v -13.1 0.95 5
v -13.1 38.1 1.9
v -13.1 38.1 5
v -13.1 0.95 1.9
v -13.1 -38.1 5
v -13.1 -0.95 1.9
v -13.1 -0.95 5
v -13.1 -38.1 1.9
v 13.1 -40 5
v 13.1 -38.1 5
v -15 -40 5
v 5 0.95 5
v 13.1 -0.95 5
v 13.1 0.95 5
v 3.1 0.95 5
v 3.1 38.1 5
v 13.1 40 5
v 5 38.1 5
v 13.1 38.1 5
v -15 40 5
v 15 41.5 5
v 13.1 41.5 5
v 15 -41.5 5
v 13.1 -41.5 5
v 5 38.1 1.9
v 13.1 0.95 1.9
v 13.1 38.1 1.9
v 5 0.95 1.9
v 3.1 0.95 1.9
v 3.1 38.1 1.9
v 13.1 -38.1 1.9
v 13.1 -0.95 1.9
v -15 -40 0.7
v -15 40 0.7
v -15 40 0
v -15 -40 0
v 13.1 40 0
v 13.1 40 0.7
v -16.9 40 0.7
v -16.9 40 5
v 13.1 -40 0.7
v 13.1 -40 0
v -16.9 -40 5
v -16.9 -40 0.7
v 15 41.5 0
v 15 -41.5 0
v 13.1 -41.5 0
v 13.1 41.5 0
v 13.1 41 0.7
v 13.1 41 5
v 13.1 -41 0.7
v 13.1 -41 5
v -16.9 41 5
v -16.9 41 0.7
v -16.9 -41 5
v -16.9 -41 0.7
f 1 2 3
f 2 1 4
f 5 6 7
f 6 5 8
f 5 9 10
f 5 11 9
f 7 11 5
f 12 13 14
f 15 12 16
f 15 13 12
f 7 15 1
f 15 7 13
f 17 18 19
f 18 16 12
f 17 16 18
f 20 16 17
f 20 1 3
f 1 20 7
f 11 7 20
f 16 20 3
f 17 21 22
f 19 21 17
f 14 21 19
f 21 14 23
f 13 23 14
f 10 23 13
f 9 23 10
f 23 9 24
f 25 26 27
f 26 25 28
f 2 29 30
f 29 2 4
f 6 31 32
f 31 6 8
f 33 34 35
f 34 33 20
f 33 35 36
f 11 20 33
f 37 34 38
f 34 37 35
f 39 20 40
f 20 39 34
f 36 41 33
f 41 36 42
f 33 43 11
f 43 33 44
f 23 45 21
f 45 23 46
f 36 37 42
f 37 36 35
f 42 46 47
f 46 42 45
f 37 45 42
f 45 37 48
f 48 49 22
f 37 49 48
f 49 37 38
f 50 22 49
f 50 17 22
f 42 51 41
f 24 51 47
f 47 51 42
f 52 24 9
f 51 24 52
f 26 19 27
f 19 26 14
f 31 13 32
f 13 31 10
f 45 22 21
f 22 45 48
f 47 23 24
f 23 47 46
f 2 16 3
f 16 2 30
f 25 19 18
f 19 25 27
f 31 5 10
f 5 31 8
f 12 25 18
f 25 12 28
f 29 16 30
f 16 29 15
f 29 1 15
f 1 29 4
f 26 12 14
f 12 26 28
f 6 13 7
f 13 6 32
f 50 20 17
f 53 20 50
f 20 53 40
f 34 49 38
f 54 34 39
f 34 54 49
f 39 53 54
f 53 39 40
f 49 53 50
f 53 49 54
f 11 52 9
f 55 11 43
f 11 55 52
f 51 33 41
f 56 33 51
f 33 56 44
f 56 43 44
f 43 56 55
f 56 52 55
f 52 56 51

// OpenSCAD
// file: ../hdim.scad
module hdim(x1 = 10, x2 = 20, y = 10, dimline_lenght = 9.0) 
{
    dimline_overlap = 0.5;
    dimline_width = 0.3;
    text_size = 2;
    tmp = 2*dimline_overlap+text_size/2;
    text_pos = dimline_lenght>0 ? tmp : -tmp; 
    dimline_abs = dimline_lenght>0 ? dimline_lenght : -dimline_lenght;
    
    color([0,0,0])
    {
        translate([x1,y-dimline_lenght/2,0]) 
            square([dimline_width, 
                dimline_abs + 2*dimline_overlap], 
                center=true, $fs=0.01);
                
        translate([x2,y-dimline_lenght/2,0]) 
            square([dimline_width, 
                dimline_abs + 2*dimline_overlap], 
                center=true, $fs=0.01);

        translate([(x1+x2)/2,y-dimline_lenght,0]) 
            square([x2-x1, 
                dimline_width], 
                center=true, $fs=0.01);
    }
        
    translate([(x1+x2)/2,y-dimline_lenght-text_pos,0]) 
    {
        color([0,0,0])
        cube([text_size * 5, 1.2*text_size, 0.9], center=true);
        
        color([0.8,0.8,0.5,1.0])
        {
            translate([0,0,0.2])
            text(str(0.1*round((x2-x1)*10)), size = text_size, 
                halign = "center",valign = "center");
            translate([0,0,-0.2])
            rotate([0,180,0])
            text(str(0.1*round((x2-x1)*10)), size = text_size, 
                halign = "center",valign = "center");
        }
    }
}

hdim();
// main file
use <../hdim.scad> 

box_l = 30; // Depth max 54
box_w = 80; 
box_h = 5;
plywood_t = 1.9;

slider_t = 1; // thickness
slider_w = 4.3; // width
slider_l = 30; // length
slider_m = slider_l; // movement

module printershelfdrawer(open = false)
{
  explode = false;
  final_view = false;
  
  edelta = explode ? 12 : 0;
  opaque10 = final_view ? 0 : 0.1;
    
  translate([open?slider_m:0,0,0])
  {  
    color([51/255, 34/255, 6/255, 1-opaque10]) 
    translate([-plywood_t/2,0,plywood_t/2])
    cube([box_l-plywood_t, box_w, plywood_t], center=true);
    
    if (!final_view) {
        hdim(-box_l/2, box_l/2-plywood_t, box_w/2, -2);
        rotate([0,0,90]) 
        hdim(-box_w/2, box_w/2, box_l/2, -5);
    }

    cover_over = 1.5;
    
    color([121/255, 44/255, 16/255, 1-2*opaque10]) {
        translate([-box_l/2+plywood_t/2-edelta,0,box_h/2+plywood_t/2])
        cube([plywood_t, box_w, box_h-plywood_t],
            center=true);
        
        translate([box_l/2-plywood_t/2+edelta,0,box_h/2])
        cube([plywood_t, box_w+2*cover_over, box_h],
            center=true); 
    }

    dim1 = (box_l - 2*plywood_t)/2;
    dim2 = (box_h - plywood_t)/2;
    dim3 = box_h/2;

    if (!final_view) {
        translate([0, -edelta, box_h/2+plywood_t/2]) 
        rotate([0,0,180]) 
        hdim(-dim1, dim1, box_w/2, -5);
        
        translate([0, -edelta-box_w/2+plywood_t/2,
            box_h/2+plywood_t/2]) 
        rotate([0,90,90]) 
        hdim(-dim2, dim2, -dim1, 5);
    }
    
    color([91/255, 78/255, 66/255, 1-2*opaque10]) {
        translate([0,box_w/2-plywood_t/2+edelta,
            box_h/2+plywood_t/2])
        cube([box_l - 2*plywood_t, plywood_t,
            box_h-plywood_t], center=true);
        
        translate([0,-box_w/2+plywood_t/2-edelta,
            box_h/2+plywood_t/2])
        cube([box_l - 2*plywood_t, plywood_t, 
            box_h-plywood_t], center=true);
    }
    
    if (!final_view) {
        translate([0,0,box_h/2+plywood_t/2])
        rotate([0,0,90]) 
        hdim(-box_w/2-cover_over, 
            box_w/2+cover_over, 
            -box_l/2-edelta, 7); 
        
        translate([edelta+box_l/2-plywood_t/2,
        0, box_h/2]) 
        rotate([0,90,-90]) hdim(-dim3, dim3, 0, -4);
    }
 
    main_divider_pos = 10;
    color([91/255, 44/255, 16/255, 1-2*opaque10]) 
    {
        ww = box_w/2 - 1.5 * plywood_t;
      translate([box_l/2 - plywood_t/2
        + edelta - main_divider_pos,
        ww/2+plywood_t/2,box_h/2+plywood_t/2])
      cube([plywood_t, ww, 
        box_h-plywood_t], center=true);
            
      translate([0,0,
            box_h/2+plywood_t/2])
      cube([box_l - 2*plywood_t, plywood_t, 
            box_h-plywood_t], center=true);

      }
    
    translate([-slider_l + box_l/2 - plywood_t, 
        box_w/2, box_h-slider_w]) 
    slider(open);
    
    translate([-slider_l + box_l/2 - plywood_t, 
        -box_w/2, box_h-slider_w]) 
    mirror([0,1,0]) 
    slider(open);
  }
}        

module slider(open = false)
{
    color([122/255, 162/255, 214/255, 1]) 
    cube([slider_l, slider_t/2, slider_w], center = false);

    translate([open?-slider_m:0,slider_t/2,0])
    color([192/255, 192/255, 255/255, 1]) 
    cube([slider_l, slider_t/2, slider_w], center = false);}



printershelfdrawer();
